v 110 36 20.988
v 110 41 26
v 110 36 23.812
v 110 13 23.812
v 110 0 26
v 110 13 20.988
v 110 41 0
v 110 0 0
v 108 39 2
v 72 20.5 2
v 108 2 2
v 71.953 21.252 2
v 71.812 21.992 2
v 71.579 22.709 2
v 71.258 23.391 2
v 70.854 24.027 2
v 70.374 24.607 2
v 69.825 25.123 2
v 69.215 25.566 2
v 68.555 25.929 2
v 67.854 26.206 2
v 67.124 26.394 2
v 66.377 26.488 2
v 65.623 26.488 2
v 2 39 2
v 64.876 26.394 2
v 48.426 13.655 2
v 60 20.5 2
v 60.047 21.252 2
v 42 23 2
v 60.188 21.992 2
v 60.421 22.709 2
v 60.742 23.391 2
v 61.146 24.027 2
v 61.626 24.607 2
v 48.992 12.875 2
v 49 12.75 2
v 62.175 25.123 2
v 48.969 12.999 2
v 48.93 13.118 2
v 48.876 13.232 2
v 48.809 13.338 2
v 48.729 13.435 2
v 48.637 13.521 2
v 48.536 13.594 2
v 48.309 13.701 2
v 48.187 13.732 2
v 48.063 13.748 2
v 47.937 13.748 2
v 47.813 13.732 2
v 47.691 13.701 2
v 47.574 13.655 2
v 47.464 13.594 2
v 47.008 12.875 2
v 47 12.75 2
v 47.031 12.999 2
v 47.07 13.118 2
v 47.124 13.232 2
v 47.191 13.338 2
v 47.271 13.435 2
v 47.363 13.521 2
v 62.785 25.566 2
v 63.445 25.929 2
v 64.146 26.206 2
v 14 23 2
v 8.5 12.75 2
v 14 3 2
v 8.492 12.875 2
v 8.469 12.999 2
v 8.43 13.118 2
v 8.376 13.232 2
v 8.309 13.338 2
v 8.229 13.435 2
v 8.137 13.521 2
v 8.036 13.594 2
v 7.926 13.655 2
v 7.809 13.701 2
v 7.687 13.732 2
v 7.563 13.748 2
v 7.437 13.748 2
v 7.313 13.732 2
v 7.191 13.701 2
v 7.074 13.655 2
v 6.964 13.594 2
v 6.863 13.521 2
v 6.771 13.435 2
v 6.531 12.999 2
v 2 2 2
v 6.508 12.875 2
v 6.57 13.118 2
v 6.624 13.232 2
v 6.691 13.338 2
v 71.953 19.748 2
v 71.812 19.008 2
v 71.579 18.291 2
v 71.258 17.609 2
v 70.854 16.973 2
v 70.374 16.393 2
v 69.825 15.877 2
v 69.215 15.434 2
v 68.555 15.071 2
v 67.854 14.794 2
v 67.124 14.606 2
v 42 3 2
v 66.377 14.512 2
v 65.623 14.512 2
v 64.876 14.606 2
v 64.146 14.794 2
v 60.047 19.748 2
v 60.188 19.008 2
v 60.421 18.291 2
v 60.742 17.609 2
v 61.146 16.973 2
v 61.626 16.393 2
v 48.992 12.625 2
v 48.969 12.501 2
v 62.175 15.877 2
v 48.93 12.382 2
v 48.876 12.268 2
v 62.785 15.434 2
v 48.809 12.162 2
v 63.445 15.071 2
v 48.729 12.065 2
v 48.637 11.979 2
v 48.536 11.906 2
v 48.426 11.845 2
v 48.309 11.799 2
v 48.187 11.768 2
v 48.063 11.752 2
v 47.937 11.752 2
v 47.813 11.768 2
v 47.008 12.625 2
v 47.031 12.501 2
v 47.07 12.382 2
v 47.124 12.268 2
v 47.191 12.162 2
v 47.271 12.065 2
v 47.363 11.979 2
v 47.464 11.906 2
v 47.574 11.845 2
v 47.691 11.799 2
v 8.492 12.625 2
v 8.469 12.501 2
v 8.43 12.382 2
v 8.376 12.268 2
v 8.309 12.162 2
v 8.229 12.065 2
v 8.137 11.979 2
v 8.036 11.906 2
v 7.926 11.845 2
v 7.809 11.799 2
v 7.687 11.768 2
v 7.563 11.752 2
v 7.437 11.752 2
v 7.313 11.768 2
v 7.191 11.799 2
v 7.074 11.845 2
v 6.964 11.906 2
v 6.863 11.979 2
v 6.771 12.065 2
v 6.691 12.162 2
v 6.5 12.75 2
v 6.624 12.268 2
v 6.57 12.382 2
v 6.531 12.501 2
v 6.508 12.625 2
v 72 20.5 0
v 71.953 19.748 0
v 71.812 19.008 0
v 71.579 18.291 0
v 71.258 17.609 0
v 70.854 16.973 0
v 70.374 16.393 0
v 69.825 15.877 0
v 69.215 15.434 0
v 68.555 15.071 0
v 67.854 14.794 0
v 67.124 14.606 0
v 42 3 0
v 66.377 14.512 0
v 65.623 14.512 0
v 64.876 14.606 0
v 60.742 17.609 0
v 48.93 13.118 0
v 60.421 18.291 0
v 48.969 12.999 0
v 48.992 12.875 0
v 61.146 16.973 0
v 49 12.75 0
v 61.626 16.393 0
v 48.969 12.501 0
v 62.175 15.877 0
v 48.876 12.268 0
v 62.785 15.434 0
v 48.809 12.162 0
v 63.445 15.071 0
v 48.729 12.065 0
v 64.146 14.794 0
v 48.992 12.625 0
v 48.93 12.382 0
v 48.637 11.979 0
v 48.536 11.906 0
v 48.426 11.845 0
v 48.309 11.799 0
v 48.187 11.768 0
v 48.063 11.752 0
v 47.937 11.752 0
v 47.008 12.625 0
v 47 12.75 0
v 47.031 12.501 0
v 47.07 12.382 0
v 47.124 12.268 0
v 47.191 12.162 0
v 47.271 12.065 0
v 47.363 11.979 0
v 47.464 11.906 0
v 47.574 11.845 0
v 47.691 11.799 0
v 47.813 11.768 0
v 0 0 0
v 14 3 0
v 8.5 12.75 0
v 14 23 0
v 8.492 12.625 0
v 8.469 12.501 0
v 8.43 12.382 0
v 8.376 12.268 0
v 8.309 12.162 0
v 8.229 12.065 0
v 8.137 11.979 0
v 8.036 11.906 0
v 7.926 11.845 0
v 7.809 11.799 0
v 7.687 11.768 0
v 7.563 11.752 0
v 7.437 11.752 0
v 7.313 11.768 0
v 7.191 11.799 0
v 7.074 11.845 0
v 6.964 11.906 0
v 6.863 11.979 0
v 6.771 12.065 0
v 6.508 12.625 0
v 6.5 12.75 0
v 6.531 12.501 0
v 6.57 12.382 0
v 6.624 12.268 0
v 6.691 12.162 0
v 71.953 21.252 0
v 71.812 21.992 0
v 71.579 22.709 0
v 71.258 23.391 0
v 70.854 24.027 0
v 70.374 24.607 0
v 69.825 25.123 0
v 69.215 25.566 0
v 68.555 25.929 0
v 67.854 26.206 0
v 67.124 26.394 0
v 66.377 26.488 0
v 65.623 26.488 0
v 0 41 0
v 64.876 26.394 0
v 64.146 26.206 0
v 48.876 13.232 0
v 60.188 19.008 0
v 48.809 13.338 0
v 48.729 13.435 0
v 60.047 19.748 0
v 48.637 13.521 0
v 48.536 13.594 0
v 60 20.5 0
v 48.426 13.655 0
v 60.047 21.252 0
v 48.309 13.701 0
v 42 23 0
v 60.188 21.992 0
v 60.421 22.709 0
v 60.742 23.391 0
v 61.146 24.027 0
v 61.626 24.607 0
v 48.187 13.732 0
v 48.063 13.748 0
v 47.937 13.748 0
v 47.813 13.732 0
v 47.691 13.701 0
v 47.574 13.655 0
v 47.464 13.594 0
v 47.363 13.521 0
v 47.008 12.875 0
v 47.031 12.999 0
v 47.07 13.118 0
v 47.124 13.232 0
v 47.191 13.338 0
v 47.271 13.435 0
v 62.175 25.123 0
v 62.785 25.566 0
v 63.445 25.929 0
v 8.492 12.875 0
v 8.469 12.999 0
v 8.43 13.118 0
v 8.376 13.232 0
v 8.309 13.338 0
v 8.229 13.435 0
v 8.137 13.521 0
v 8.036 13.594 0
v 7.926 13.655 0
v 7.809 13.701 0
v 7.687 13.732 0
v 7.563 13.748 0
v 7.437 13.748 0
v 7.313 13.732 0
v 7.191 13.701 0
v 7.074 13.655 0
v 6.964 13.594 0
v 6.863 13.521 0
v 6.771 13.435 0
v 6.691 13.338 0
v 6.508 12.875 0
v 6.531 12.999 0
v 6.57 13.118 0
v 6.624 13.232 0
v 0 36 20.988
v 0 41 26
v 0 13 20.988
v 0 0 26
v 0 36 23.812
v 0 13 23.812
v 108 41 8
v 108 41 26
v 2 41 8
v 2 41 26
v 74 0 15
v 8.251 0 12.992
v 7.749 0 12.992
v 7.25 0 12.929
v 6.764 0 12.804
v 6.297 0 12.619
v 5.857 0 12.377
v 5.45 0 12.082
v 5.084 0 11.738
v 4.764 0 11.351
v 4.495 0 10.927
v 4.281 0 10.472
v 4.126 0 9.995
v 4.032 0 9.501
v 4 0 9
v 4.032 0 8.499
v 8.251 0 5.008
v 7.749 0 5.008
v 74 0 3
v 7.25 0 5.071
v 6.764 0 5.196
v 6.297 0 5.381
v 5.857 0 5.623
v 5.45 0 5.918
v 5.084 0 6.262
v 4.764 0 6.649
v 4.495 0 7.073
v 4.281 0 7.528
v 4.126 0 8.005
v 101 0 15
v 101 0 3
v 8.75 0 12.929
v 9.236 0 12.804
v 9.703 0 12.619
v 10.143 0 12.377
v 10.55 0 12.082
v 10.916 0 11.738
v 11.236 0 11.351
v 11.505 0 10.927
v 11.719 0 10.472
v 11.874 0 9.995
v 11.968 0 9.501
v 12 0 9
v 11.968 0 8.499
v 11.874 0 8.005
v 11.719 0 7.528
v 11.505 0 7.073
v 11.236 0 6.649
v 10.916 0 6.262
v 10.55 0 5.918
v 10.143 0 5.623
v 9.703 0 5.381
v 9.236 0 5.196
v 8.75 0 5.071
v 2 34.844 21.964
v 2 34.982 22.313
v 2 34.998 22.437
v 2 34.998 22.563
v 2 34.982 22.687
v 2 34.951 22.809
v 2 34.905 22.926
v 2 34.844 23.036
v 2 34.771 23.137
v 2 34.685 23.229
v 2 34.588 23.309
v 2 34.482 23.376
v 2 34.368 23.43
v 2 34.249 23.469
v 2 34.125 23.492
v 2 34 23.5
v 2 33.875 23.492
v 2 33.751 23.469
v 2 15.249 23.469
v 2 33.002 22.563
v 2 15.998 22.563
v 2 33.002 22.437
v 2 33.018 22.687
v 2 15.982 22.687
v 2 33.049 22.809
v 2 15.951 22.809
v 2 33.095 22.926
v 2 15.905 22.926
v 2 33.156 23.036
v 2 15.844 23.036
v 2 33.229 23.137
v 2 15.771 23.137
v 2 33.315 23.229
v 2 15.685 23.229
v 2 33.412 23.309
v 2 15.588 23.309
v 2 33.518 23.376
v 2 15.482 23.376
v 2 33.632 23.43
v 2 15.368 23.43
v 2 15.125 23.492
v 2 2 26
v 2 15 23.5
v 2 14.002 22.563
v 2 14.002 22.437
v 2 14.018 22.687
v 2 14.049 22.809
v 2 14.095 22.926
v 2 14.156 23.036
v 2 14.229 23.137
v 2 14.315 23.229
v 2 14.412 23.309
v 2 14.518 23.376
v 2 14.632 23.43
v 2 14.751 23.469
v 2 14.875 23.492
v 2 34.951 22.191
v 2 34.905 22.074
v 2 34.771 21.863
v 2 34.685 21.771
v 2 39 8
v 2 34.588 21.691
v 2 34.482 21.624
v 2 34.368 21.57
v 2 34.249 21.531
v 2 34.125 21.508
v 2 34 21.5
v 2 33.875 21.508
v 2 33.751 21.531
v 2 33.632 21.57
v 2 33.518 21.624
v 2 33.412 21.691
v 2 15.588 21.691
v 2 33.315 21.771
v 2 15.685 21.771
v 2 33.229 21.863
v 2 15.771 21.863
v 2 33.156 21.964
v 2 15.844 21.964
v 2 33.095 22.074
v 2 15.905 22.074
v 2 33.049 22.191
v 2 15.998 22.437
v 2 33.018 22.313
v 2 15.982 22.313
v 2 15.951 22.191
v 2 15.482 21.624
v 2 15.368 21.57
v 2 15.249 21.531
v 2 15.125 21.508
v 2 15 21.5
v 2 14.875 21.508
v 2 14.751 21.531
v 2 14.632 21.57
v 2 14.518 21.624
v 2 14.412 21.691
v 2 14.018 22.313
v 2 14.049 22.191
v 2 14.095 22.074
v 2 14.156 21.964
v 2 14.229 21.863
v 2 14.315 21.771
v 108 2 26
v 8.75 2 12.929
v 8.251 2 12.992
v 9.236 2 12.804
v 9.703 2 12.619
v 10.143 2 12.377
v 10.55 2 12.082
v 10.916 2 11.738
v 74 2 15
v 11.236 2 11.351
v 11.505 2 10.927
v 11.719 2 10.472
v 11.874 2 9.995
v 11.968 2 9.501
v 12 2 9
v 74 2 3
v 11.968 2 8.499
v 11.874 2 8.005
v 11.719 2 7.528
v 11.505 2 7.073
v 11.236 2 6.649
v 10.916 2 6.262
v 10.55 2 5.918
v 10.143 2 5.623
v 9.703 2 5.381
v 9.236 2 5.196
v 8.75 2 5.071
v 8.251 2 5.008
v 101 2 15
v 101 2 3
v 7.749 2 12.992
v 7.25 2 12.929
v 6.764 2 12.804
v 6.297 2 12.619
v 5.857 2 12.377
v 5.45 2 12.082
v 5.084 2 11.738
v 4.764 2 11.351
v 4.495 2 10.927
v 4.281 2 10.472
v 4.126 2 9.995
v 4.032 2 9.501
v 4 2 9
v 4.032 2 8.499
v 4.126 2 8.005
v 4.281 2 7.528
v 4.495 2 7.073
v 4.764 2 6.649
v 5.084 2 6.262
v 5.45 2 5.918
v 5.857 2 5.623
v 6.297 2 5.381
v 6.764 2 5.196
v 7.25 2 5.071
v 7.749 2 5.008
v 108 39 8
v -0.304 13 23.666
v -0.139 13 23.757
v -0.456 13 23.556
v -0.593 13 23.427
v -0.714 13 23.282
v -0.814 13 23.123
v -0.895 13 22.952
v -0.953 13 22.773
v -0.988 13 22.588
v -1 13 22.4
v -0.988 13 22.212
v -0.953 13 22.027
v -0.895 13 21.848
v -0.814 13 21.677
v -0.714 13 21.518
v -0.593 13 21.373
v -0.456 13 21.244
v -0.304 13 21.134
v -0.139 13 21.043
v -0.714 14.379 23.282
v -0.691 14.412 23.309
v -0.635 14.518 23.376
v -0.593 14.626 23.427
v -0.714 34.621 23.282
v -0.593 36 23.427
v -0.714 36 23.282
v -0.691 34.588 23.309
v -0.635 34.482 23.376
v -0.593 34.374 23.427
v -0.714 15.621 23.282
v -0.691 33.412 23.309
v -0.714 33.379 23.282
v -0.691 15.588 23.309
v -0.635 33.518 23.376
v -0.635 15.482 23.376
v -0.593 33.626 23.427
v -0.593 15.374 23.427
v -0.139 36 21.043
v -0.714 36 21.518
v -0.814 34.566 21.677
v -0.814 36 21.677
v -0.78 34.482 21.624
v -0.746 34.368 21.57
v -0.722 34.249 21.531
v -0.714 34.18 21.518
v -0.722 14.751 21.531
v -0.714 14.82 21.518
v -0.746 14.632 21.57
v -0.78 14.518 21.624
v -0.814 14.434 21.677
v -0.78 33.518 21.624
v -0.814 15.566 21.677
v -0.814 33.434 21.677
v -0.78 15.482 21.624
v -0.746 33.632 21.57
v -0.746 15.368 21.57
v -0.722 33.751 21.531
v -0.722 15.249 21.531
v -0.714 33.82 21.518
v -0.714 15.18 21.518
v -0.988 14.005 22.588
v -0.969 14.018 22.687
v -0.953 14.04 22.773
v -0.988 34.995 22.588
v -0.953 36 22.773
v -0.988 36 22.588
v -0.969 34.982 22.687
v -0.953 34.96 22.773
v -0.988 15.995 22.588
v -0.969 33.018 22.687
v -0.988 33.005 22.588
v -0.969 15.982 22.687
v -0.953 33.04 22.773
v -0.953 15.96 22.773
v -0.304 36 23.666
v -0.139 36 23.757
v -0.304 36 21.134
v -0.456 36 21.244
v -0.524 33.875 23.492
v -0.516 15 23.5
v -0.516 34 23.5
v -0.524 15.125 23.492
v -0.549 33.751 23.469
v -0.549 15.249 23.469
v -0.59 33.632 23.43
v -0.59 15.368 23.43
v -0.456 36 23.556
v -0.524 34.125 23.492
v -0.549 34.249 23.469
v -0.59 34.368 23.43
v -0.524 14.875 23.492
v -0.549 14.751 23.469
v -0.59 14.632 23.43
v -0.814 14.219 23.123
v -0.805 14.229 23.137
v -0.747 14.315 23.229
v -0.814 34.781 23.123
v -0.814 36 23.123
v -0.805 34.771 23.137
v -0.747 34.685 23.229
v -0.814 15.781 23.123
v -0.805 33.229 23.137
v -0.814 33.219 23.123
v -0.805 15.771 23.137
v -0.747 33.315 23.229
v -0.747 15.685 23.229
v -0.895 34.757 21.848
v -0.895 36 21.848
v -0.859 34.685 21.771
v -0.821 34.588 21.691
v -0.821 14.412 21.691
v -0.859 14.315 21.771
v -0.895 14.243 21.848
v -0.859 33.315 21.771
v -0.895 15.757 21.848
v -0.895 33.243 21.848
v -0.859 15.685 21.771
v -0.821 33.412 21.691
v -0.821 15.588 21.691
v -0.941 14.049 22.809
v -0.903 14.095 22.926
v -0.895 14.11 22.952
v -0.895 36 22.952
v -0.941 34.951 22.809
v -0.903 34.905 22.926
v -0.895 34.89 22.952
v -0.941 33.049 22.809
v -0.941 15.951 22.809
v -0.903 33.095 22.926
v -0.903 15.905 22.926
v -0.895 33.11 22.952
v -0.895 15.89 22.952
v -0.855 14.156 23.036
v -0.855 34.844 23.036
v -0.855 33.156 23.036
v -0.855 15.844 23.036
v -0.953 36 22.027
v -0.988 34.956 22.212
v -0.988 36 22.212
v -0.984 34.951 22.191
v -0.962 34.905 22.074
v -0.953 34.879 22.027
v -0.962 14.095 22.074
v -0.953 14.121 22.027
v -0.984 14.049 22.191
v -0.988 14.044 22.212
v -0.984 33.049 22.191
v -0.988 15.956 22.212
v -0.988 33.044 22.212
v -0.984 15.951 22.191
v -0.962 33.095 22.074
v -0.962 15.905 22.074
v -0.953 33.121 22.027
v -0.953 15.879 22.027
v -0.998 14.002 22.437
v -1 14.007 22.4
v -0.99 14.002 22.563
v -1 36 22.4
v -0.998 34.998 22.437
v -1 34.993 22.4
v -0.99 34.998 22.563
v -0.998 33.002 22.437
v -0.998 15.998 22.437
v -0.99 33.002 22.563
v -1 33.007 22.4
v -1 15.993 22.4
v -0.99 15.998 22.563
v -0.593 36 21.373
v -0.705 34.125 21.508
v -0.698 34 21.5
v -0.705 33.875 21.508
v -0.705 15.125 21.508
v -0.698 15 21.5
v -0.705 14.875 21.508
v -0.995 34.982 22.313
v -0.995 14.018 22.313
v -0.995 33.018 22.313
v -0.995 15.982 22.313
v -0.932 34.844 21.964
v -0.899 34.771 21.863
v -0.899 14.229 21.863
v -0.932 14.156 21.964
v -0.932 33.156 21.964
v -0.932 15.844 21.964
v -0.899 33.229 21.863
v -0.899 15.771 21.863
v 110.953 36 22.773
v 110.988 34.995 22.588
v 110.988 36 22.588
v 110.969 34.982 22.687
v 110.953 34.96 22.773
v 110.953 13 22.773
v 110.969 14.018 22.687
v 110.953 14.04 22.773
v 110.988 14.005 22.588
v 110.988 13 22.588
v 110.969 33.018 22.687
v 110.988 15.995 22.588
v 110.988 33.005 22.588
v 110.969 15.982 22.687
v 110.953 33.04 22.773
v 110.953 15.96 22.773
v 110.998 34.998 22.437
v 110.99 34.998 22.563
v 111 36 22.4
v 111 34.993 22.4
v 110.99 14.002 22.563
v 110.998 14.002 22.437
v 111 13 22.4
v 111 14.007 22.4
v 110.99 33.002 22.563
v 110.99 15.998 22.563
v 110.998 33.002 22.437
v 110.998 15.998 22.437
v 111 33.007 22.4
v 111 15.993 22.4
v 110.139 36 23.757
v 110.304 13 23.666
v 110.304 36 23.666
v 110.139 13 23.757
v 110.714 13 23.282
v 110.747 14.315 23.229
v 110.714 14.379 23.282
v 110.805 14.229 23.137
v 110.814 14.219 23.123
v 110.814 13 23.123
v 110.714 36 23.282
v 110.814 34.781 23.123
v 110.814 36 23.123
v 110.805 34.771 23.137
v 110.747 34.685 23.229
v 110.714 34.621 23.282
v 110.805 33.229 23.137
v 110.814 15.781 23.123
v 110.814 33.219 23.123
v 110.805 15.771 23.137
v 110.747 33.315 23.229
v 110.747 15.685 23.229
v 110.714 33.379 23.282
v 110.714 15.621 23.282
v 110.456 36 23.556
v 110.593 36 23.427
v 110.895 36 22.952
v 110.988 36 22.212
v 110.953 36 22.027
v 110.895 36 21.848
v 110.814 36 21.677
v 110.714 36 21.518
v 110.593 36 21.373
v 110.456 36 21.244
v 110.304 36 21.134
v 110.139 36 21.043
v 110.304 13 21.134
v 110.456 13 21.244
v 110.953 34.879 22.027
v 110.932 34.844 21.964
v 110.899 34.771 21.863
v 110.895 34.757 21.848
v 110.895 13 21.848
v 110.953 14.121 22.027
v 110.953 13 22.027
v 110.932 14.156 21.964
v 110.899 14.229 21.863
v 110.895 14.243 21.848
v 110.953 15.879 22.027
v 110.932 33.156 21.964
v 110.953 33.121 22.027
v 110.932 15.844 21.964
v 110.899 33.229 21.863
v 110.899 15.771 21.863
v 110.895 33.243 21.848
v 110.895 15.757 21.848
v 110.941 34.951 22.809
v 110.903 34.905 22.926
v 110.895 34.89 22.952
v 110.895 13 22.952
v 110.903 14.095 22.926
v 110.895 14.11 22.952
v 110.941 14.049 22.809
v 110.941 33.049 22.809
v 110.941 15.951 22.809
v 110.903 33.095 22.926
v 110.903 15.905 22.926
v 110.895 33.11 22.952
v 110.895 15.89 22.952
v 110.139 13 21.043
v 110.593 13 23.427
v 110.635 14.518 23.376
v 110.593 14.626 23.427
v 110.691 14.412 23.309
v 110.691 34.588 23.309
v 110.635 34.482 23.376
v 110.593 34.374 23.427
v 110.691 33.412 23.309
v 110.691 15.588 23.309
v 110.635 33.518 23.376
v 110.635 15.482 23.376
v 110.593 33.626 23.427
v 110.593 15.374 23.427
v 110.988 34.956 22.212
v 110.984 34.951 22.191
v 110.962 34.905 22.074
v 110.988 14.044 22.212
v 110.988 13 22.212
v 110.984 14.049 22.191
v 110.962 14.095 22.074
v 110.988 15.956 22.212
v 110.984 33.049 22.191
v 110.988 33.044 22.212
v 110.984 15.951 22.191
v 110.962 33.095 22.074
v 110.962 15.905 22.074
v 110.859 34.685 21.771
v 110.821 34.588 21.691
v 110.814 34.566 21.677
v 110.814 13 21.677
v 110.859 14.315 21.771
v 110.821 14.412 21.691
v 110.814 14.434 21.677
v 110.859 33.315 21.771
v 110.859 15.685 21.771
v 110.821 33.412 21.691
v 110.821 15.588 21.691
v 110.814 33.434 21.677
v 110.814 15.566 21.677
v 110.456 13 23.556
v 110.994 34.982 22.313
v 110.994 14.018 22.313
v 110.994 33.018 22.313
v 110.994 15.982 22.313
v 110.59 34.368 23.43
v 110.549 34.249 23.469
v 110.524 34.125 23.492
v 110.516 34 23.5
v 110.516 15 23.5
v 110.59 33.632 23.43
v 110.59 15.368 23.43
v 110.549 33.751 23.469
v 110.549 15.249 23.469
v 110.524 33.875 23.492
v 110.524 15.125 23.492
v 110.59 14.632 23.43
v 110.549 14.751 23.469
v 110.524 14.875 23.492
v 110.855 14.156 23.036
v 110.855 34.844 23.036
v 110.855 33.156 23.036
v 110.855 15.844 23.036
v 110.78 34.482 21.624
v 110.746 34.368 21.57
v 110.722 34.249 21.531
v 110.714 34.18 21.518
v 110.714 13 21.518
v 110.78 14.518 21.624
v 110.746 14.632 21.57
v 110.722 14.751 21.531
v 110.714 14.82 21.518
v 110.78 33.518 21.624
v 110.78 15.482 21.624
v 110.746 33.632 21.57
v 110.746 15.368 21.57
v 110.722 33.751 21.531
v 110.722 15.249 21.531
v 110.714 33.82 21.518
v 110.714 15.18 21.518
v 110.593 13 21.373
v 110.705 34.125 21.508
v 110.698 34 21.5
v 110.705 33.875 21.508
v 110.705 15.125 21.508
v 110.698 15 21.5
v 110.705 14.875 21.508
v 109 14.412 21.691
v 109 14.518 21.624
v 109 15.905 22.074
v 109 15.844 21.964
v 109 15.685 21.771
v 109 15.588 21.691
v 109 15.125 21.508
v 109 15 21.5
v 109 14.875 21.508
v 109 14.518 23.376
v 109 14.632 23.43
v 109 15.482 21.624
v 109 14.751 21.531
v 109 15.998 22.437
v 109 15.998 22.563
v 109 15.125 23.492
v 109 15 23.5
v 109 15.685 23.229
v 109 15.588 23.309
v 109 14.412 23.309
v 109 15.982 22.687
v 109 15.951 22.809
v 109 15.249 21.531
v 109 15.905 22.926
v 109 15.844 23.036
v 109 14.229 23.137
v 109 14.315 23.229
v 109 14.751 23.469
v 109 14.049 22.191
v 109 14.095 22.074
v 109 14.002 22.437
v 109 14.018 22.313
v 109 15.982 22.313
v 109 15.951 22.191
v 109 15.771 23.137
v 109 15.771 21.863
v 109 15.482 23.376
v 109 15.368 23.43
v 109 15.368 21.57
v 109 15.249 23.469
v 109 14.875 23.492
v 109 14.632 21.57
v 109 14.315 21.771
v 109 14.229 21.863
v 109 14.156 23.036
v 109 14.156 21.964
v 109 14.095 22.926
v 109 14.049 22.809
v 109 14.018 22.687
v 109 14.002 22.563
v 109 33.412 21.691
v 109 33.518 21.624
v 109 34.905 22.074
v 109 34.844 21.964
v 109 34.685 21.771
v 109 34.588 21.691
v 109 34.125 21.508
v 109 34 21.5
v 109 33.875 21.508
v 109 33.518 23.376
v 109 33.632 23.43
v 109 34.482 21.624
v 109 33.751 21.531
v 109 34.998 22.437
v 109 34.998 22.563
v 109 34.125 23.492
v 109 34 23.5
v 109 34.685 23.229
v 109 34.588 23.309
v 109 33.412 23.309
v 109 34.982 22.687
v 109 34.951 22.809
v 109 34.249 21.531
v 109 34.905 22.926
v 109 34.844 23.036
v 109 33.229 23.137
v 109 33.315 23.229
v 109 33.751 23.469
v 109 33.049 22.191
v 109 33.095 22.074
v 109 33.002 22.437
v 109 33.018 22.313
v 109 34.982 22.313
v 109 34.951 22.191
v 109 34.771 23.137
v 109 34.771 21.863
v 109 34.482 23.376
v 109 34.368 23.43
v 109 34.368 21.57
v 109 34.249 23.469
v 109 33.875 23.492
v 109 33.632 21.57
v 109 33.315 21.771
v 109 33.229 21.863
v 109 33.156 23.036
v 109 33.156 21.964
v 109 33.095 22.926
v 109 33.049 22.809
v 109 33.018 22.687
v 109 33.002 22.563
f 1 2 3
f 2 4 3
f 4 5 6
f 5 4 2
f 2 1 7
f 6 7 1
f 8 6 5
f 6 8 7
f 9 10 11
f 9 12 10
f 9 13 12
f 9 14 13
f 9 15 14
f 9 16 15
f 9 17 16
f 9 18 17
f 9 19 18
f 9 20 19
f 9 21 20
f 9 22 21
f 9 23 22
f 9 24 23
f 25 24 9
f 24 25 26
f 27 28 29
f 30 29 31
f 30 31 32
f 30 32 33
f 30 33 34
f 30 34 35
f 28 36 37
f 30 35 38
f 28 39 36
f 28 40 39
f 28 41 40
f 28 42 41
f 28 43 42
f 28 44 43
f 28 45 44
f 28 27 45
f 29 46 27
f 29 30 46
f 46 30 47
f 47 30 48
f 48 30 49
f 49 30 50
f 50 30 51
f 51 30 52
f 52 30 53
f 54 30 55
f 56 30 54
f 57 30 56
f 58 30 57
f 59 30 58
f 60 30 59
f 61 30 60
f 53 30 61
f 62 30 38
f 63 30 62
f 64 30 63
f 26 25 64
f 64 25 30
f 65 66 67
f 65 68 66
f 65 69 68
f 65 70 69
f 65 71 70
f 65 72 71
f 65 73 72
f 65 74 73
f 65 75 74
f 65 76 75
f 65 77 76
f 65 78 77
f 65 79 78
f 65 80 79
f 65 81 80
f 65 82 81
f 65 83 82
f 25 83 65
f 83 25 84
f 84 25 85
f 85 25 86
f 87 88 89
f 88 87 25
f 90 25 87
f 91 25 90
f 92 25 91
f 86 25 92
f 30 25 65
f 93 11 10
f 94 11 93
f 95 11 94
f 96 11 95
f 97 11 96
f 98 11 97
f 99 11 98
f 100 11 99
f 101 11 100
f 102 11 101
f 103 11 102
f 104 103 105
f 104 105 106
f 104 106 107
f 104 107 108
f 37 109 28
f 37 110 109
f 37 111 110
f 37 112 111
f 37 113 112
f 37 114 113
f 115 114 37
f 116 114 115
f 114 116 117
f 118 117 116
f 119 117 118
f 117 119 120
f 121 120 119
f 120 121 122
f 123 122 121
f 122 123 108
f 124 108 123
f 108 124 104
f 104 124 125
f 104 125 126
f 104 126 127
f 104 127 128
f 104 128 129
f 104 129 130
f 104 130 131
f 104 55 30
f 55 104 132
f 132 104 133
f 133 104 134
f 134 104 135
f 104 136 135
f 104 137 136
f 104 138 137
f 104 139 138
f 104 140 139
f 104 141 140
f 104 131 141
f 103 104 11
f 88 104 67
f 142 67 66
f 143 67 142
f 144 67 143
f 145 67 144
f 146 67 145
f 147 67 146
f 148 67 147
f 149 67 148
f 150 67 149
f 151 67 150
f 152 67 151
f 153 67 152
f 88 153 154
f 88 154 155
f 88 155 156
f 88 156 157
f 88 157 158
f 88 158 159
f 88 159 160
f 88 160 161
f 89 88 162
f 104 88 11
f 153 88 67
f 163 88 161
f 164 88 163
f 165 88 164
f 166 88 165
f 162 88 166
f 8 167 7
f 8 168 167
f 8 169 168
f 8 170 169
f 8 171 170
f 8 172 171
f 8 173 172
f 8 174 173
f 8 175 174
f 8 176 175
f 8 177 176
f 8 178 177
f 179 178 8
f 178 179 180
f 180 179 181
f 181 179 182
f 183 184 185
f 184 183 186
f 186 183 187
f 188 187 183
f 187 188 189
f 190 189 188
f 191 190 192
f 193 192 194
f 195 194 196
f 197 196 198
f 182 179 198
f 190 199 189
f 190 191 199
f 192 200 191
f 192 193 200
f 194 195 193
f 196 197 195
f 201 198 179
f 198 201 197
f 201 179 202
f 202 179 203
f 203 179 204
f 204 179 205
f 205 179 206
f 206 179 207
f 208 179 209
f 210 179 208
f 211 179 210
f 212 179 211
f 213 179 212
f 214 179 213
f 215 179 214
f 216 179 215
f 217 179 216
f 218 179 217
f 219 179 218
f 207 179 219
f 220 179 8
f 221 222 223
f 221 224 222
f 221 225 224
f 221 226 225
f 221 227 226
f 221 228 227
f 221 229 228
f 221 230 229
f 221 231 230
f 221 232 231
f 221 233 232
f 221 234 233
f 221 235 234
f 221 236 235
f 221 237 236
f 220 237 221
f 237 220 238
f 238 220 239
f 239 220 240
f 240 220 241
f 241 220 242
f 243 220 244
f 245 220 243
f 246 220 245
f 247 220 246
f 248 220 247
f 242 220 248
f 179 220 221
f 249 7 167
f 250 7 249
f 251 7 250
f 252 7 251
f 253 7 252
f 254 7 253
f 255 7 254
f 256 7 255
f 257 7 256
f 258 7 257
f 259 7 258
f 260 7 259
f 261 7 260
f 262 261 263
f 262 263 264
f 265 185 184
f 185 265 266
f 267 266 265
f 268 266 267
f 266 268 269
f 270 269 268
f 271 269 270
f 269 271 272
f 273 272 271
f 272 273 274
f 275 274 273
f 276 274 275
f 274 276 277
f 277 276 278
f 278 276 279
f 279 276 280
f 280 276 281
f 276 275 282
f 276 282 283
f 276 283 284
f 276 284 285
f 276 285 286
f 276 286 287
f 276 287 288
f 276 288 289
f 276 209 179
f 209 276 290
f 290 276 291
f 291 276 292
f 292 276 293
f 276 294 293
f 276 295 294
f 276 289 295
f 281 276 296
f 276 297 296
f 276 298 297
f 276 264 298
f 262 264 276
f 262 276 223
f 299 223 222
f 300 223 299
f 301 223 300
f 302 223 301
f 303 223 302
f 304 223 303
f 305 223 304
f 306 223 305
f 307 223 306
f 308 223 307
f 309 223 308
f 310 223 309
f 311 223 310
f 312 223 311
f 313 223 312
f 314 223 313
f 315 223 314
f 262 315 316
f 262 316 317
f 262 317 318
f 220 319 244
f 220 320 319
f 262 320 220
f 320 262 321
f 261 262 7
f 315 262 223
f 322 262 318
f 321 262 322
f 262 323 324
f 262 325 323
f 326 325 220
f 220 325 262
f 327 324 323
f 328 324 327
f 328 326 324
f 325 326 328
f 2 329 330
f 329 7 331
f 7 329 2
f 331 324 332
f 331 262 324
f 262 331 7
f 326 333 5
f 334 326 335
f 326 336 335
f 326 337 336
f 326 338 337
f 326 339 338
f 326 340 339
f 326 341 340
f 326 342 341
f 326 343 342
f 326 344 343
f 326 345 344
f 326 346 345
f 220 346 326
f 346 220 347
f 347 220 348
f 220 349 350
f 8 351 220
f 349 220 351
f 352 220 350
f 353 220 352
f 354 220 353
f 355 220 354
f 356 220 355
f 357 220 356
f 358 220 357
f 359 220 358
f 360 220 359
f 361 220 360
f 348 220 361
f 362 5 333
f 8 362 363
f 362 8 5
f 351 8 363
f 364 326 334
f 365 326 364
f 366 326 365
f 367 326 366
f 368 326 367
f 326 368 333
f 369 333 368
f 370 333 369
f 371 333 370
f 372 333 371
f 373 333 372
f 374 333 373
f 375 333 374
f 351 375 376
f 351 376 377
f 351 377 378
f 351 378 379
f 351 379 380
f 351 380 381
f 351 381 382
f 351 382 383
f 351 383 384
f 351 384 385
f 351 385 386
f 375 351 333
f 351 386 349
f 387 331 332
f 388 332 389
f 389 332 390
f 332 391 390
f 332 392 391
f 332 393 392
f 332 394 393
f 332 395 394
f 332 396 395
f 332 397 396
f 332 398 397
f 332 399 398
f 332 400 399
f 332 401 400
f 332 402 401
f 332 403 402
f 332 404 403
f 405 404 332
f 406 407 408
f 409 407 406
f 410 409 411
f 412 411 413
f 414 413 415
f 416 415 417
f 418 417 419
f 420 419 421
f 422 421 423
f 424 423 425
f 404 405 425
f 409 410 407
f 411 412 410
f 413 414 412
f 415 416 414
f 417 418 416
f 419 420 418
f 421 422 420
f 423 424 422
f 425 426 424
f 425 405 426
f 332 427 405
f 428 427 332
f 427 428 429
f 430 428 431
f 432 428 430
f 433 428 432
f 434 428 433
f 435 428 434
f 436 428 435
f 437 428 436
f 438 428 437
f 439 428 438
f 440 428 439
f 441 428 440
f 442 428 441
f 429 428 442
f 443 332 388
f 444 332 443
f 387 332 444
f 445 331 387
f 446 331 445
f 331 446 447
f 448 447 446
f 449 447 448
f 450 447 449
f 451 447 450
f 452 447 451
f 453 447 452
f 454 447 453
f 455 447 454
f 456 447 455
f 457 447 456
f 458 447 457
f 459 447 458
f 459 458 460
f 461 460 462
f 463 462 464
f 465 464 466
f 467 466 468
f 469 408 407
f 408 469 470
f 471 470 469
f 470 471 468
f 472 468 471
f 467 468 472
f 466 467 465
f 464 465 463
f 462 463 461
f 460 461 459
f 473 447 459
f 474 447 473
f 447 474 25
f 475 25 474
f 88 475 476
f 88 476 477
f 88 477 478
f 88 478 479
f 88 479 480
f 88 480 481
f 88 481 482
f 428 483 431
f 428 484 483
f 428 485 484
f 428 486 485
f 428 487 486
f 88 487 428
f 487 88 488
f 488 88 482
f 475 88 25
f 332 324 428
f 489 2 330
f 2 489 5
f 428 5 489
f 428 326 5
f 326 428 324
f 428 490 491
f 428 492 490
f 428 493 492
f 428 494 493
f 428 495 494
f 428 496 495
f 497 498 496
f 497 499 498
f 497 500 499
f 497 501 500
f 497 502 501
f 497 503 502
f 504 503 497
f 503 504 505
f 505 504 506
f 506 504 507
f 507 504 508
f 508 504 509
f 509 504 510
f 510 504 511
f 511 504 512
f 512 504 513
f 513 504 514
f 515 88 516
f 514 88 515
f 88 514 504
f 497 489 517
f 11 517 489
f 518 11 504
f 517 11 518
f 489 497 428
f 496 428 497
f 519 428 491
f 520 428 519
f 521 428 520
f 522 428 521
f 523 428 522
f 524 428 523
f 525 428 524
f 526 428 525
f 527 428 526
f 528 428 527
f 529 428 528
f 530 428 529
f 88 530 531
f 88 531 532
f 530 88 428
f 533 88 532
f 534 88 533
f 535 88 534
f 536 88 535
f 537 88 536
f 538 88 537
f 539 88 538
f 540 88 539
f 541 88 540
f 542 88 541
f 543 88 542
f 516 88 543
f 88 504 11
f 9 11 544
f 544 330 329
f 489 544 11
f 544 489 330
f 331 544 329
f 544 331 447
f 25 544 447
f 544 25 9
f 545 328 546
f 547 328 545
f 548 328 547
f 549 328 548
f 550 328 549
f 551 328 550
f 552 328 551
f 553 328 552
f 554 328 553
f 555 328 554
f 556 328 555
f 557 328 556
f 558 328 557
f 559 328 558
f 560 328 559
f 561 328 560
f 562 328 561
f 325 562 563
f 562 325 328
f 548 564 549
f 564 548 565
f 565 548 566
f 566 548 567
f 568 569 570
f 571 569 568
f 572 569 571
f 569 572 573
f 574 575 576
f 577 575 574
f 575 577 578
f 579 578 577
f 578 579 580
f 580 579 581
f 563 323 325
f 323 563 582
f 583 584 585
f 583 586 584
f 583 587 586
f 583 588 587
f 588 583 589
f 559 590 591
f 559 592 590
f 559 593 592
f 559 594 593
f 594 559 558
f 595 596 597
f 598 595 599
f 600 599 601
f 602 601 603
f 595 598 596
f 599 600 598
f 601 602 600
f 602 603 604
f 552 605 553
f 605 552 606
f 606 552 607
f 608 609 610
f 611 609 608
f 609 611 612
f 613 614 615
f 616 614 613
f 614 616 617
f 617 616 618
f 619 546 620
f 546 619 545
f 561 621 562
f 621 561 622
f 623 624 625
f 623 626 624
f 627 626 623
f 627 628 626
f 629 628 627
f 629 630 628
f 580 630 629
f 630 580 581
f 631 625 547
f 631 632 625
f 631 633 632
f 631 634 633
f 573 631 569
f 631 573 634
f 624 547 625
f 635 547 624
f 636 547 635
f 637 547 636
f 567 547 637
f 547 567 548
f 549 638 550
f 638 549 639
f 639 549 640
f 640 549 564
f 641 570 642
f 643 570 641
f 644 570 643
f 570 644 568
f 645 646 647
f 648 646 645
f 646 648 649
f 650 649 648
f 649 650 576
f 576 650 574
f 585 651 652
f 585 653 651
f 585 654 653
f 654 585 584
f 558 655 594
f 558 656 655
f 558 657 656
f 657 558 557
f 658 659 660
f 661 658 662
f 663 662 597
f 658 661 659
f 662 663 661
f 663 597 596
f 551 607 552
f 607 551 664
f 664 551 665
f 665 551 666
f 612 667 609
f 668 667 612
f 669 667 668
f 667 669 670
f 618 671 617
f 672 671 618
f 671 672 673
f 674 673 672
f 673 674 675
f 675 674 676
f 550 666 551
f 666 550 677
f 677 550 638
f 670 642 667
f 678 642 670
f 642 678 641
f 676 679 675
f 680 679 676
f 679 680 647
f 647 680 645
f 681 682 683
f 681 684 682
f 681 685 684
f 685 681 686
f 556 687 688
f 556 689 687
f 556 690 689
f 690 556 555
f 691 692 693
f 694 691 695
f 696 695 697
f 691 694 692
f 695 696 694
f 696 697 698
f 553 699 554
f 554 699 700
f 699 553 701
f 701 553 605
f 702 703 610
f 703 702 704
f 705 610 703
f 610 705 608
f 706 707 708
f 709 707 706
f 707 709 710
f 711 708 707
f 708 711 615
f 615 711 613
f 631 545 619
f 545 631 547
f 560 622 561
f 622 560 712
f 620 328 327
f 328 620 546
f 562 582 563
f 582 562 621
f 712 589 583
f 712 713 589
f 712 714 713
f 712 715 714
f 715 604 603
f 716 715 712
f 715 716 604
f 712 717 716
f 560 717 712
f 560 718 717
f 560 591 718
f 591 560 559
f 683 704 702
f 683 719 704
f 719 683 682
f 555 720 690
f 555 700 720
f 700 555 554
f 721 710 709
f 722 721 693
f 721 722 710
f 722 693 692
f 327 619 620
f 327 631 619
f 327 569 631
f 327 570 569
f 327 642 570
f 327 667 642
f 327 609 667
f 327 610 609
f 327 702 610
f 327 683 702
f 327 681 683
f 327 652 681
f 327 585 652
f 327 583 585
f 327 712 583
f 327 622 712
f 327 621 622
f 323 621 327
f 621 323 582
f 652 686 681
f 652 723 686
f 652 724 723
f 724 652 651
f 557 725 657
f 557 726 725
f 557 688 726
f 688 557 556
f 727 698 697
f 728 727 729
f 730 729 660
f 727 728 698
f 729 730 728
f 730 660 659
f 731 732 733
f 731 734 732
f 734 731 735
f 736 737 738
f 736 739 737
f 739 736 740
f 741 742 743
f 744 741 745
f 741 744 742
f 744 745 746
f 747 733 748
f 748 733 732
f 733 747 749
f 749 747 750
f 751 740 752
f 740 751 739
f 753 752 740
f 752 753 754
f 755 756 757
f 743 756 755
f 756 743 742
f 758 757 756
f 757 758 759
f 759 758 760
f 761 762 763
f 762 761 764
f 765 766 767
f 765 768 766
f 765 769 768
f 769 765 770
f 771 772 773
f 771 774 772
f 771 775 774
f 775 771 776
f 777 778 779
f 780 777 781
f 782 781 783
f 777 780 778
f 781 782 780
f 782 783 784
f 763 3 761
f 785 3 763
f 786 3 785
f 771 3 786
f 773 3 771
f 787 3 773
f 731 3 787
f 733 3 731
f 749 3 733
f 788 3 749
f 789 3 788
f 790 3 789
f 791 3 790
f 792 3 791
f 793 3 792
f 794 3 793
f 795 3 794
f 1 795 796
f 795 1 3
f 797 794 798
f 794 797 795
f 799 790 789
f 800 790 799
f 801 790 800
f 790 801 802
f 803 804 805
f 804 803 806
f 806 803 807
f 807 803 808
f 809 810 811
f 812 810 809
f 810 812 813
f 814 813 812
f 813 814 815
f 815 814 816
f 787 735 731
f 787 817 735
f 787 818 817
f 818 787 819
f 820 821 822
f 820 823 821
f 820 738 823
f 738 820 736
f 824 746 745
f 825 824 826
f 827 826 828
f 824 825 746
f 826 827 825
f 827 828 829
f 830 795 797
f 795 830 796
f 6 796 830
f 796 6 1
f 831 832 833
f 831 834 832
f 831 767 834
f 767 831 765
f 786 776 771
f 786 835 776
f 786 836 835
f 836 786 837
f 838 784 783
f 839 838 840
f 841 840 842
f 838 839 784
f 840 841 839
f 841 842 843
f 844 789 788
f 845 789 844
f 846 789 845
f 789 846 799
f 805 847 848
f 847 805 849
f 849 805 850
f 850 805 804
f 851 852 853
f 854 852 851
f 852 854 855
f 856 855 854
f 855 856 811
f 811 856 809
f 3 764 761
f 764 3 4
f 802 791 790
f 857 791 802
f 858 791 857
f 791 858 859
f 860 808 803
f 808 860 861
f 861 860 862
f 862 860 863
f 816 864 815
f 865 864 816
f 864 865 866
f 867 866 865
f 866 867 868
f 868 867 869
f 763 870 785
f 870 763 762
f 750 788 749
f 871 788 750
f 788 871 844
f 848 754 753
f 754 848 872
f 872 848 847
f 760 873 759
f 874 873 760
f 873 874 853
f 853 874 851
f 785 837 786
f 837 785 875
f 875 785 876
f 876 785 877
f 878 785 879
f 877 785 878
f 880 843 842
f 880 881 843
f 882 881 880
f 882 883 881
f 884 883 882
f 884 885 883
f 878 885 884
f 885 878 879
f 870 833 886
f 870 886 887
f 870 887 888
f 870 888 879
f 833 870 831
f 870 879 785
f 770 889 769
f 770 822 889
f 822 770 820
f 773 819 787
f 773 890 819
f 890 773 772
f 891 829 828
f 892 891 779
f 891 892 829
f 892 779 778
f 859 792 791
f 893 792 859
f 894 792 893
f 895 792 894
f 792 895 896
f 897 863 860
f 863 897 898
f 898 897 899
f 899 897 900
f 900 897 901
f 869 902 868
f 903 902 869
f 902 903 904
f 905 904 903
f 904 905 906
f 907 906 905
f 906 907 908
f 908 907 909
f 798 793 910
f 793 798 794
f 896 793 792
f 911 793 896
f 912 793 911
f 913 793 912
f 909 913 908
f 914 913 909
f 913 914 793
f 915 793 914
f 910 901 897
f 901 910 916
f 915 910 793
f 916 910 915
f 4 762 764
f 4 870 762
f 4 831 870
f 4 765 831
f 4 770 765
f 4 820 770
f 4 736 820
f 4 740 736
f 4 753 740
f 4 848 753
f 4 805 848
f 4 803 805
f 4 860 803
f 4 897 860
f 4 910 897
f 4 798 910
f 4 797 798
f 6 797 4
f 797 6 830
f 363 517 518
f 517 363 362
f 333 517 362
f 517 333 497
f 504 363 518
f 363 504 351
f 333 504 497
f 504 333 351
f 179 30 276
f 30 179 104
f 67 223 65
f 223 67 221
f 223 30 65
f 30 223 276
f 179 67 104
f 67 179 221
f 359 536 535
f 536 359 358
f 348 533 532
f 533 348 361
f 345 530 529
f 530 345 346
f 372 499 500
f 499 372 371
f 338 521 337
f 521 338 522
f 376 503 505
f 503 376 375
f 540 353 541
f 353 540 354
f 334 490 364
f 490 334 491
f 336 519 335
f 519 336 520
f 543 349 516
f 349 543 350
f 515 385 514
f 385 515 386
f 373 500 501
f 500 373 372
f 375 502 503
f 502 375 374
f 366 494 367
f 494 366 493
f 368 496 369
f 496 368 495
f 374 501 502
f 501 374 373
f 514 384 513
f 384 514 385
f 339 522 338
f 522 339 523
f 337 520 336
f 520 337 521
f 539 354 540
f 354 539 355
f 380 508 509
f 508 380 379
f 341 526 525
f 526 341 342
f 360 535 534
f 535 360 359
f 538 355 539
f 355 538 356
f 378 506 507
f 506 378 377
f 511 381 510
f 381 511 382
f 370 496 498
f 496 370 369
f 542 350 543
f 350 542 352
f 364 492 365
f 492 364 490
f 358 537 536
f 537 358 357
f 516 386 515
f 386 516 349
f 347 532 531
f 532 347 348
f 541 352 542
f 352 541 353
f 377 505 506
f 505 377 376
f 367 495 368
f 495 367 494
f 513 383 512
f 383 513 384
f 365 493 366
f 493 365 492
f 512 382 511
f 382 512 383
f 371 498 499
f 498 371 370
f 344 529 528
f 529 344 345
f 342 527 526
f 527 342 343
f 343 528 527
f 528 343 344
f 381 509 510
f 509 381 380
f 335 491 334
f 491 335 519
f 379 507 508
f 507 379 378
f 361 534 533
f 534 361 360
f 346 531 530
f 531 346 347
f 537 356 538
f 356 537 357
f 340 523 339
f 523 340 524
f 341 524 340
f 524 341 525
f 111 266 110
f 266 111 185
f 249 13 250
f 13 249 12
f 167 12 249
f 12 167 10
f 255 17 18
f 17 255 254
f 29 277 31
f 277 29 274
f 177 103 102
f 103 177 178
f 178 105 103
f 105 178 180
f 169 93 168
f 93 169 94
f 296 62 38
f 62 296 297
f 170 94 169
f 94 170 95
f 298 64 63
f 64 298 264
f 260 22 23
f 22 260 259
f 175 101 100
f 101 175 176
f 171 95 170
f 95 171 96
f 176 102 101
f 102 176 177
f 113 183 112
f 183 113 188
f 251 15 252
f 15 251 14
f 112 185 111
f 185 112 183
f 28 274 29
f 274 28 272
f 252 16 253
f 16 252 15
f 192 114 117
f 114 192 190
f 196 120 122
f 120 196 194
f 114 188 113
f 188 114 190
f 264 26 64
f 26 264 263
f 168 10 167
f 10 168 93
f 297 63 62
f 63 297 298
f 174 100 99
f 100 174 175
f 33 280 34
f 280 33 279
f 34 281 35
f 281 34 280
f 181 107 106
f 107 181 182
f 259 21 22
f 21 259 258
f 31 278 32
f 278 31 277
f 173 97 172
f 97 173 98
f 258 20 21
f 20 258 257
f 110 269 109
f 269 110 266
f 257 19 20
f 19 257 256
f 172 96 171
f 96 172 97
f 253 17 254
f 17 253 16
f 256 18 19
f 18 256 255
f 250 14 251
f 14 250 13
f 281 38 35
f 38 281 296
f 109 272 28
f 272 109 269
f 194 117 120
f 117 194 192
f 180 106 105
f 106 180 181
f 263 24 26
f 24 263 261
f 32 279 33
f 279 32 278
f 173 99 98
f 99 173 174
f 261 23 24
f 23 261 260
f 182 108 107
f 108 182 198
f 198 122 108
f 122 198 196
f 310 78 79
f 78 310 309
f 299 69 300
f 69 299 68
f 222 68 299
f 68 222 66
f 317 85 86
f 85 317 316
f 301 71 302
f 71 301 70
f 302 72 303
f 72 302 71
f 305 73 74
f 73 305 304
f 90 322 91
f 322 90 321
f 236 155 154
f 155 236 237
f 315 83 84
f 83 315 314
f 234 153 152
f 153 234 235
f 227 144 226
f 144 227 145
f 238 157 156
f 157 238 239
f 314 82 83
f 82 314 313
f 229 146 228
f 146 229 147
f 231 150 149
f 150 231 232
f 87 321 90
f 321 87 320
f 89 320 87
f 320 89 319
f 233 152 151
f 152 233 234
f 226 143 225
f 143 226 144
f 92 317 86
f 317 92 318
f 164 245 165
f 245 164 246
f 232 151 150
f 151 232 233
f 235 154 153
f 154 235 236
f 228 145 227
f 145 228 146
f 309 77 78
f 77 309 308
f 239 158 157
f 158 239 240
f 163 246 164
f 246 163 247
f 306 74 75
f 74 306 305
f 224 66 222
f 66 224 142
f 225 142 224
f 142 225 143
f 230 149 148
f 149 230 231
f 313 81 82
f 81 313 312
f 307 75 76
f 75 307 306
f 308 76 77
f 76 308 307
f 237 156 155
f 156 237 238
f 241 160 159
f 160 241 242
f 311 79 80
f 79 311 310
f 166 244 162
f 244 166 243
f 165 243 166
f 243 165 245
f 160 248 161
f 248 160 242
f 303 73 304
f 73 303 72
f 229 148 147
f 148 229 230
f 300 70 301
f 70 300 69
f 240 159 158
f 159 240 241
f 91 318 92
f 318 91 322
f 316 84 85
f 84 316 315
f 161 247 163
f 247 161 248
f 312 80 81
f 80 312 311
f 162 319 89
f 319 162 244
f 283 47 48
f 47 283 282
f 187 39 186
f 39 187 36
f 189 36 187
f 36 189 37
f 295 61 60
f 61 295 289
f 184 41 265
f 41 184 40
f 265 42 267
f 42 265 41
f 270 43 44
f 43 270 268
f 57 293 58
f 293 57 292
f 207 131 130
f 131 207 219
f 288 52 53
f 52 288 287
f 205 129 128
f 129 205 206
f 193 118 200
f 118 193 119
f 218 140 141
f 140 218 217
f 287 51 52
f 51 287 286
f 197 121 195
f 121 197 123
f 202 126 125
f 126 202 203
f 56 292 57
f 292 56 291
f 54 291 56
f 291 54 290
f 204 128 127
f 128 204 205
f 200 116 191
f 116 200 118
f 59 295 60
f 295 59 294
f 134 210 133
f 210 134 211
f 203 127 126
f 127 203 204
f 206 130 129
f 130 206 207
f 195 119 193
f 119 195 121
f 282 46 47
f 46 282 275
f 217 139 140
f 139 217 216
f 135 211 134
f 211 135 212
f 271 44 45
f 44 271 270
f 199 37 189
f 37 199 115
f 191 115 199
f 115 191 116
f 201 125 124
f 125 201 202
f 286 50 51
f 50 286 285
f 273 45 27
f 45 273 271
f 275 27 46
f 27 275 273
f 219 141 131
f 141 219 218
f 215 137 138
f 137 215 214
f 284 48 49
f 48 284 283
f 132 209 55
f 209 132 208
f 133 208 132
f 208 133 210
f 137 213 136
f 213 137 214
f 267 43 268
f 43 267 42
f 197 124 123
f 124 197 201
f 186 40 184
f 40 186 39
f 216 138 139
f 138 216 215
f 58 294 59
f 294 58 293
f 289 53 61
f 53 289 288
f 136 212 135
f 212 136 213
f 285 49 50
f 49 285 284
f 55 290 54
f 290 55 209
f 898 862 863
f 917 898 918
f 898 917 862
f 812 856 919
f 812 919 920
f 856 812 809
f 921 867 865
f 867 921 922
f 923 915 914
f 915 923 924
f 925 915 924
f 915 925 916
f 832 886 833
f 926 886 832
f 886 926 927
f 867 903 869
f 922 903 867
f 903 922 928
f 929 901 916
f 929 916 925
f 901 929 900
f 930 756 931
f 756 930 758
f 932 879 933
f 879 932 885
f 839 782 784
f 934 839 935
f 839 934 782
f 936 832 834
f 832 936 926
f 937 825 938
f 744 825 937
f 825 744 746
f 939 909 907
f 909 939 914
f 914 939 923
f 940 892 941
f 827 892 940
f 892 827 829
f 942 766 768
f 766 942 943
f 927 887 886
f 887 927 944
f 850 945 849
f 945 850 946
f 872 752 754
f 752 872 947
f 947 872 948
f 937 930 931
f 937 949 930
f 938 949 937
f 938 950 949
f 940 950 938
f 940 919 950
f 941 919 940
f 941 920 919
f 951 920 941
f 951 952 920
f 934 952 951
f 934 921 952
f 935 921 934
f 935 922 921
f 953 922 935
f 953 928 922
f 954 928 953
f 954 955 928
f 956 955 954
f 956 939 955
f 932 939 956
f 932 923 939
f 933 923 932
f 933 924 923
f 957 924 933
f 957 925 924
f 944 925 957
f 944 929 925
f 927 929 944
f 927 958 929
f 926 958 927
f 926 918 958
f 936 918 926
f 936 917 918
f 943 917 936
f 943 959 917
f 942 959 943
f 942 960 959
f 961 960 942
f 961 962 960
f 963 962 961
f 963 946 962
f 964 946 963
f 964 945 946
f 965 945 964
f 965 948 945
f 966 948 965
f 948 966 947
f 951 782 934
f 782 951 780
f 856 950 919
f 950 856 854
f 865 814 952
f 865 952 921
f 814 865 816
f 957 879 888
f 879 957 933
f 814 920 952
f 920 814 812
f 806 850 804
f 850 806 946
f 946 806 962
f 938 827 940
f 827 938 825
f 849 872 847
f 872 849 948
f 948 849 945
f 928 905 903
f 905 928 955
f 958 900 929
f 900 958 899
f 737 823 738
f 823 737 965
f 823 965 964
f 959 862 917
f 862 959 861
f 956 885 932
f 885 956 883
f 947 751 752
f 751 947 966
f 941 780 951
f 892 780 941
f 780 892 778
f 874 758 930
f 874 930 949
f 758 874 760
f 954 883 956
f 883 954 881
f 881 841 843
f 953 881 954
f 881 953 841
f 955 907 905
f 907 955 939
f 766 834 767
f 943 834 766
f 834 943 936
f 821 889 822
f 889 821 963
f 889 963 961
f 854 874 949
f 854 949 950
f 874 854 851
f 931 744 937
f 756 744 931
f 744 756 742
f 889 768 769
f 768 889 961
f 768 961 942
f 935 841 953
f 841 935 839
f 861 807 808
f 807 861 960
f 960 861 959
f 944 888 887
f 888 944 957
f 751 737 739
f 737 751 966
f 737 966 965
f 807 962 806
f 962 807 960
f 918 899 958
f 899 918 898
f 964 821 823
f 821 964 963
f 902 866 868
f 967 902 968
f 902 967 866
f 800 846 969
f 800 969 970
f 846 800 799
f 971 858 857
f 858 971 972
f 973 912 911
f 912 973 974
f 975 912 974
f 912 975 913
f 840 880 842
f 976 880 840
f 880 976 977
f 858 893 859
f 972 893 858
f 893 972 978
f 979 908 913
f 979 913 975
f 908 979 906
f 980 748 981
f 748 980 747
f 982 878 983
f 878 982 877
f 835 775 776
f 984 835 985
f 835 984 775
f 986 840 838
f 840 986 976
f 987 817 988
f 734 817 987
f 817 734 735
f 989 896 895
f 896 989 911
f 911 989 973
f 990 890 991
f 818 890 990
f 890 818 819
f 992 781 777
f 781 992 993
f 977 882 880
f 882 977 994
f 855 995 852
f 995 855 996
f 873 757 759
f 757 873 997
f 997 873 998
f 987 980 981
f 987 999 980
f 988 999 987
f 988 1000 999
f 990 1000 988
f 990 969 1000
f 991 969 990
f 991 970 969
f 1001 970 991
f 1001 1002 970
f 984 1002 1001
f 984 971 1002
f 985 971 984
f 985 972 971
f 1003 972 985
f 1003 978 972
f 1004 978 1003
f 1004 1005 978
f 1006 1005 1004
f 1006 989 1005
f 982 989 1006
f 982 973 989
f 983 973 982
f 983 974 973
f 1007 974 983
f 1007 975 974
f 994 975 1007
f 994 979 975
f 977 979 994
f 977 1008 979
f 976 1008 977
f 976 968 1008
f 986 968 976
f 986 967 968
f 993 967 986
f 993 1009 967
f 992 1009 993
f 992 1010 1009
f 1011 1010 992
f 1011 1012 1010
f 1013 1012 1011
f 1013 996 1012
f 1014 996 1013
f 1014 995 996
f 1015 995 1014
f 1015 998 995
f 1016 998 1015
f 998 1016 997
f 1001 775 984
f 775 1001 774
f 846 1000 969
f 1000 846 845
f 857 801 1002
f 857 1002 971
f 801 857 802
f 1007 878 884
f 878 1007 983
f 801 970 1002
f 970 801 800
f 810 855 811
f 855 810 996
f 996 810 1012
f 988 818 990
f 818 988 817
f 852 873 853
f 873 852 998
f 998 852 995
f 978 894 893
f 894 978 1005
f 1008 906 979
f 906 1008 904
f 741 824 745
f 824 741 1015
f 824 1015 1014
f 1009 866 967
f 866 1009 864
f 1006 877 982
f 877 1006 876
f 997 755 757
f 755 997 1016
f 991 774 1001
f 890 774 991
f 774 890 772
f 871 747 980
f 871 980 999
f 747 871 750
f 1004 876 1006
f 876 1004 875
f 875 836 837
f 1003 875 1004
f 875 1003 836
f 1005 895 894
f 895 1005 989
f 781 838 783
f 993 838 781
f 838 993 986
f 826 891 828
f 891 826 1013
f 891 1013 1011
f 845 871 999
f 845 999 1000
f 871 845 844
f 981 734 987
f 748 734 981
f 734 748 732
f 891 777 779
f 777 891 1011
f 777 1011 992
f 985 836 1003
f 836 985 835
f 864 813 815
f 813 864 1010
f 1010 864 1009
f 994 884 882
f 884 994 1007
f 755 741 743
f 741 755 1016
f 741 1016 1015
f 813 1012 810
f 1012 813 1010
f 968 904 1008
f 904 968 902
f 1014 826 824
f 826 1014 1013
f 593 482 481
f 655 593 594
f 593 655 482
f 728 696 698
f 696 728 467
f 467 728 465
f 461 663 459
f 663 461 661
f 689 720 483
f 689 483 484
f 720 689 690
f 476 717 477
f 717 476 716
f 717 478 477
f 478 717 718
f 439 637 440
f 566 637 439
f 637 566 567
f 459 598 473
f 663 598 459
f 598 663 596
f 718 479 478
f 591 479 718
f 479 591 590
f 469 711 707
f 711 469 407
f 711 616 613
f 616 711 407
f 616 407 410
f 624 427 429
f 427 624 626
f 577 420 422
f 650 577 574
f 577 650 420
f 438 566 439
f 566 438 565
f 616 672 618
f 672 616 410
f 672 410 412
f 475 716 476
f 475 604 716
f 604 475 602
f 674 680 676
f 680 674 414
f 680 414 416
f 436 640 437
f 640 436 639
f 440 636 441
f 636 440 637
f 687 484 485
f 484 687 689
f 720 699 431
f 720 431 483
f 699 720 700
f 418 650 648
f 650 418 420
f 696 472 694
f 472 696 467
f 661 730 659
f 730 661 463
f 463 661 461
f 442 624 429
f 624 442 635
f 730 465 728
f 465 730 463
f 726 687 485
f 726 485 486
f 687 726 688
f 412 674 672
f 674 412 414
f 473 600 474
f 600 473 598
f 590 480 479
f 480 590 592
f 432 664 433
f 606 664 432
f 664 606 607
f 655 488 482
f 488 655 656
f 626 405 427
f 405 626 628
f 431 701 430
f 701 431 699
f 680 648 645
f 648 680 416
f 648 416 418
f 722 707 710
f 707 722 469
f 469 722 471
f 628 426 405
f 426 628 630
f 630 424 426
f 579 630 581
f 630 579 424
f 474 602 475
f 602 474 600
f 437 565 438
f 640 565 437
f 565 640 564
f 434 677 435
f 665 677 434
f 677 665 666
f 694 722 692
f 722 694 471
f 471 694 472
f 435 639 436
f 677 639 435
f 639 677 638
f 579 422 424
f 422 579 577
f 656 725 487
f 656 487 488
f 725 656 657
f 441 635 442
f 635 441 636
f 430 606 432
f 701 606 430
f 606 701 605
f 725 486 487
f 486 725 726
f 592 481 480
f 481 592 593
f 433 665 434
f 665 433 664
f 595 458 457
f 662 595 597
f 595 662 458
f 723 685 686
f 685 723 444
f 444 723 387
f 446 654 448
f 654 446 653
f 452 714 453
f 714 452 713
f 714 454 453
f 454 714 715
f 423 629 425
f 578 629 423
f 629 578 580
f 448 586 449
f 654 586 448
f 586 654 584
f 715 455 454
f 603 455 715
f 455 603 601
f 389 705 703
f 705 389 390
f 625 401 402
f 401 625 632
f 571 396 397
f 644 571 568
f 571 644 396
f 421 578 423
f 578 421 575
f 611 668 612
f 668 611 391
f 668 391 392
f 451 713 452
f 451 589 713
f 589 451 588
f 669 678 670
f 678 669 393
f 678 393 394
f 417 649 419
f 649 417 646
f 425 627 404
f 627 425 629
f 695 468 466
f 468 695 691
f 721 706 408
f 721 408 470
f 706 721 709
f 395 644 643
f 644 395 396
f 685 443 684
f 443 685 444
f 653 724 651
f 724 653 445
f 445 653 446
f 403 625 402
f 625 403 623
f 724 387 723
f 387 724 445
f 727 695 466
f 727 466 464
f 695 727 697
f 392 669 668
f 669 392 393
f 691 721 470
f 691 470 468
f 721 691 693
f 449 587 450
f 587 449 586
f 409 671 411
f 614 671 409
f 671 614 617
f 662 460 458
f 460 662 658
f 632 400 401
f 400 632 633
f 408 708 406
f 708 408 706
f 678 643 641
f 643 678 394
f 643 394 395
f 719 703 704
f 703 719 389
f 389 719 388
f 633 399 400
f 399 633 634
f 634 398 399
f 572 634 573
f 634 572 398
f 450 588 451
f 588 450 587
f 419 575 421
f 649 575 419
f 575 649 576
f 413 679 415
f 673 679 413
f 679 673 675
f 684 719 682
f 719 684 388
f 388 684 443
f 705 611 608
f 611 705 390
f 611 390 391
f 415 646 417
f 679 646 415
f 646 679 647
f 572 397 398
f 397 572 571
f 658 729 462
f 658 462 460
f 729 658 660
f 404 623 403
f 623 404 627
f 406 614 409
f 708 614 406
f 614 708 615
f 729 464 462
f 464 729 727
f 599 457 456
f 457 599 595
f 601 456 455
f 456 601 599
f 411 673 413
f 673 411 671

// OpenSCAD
/*************************************************************************************************
Power Supply Terminal Cover for the power supply commonly used with the Bukobot and other 3d printers
Author: Mike Thompson (thingiverse: mike_linus)
Modified by: Will Winder (thingiverse: Winder)
Date Last Modified: June 1, 2013
Description: simply change the cutout parameters and depth to suit. 
Note: do not change length, height and thickness parameters for the base unless you want to change the core dimensions.
**************************************************************************************************/

//***************************************************************
//don't change these base parameters unless you want to change the core dimensions.
//***************************************************************
/* [Enclosue Size] */
// Long edge of enclosure.

base_length=110;
// Height of enclosure.
base_height=41;

// Deptch of enclosure. Increase this to create more room for your electronics.
base_depth=26;

// Surface thickness of part. 2mm seems to be pretty good.
base_thickness=2;

// Size of hole for cover retaining screws.
mounting_screw_hole_cutout_radius=1;

// Size of hole for power plug screws.
power_screw_hole_cutout_radius=1;

//***************************************************************
//change these cutout parameters to suit you own switch size etc.
//***************************************************************
/* [Cutouts] */
// Square switch cutout - long edge. Set to zero if using a round cutout.
switch_cutout_length=27;
// Square switch cutout - short edge. Set to zero if using a round cutout.
switch_cutout_width=12;

// Round switch cutout radius. Set to zero to use a square cutout. Base depth must be increased depending on the size of your switch.
switch_cutout_radius=0;

// Radius of cutout for LED.
led_cutout_radius=4;
// Radius of cutout for 12v wires.
grommet_cutout_radius=6;

// Square power plug cutout - long edge.
power_plug_cutout_length=28;
// Square power plug cutout - short edge.
power_plug_cutout_width=20;

/* [Hidden] */
hole_resolution=50;
$fn=hole_resolution;

module base(){
union() {
	// 5 sides of the box.
	cube([base_length,base_height,base_thickness]);
	cube([base_thickness,base_height,base_depth]);
	cube([base_length,base_thickness,base_depth]);
	translate([base_length-base_thickness,0,0])cube([base_thickness,base_height,base_depth]);
	// Bottom wall has an 18mm gap at the rear for the terminal area.
	translate([0,base_height-base_thickness,0])cube([base_length,base_thickness,base_depth-18]);

	// (square) Original slot retainers
	//translate([-1,13,base_depth-5])cube([1.5,23,3]);
	//translate([base_length+base_thickness,13,base_depth-5])cube([1.5,23,3]);

	// (cylindrical) New slot retainers.
	translate([0.5,23+13,base_depth-3.6])rotate([90,0,0])
		cylinder(r=1.5, h=23);
	translate([base_length-0.5,23+13,base_depth-3.6])rotate([90,0,0])
		cylinder(r=1.5, h=23);

}
}

safety_margin = base_thickness/2;
difference(){
	base();
	//(square) switch cutout. 9mm away from one side.
	translate([base_length-9-switch_cutout_length,-safety_margin,3])
		cube([switch_cutout_length,base_thickness*2,switch_cutout_width]);

	//(round) switch cutout. Centered 18mm from one side.
	translate([base_length-18, base_thickness+safety_margin, 6+switch_cutout_radius])rotate([90,0,0])
		cylinder(r=switch_cutout_radius, h=base_thickness*2);

	//240v plug cutout. Centered 28mm from one side.
	translate([28-(power_plug_cutout_length/2),3,-safety_margin])
		cube([power_plug_cutout_length,power_plug_cutout_width,base_thickness*2]);

	//led cutout. Centered 8mm from one side.
	translate([8,base_thickness+safety_margin,9])rotate([90,0,0])
		cylinder(r=led_cutout_radius,h=base_thickness*2);

	//12v lead cutout. Shifted 3/5 of the way to one side.
	translate([base_length/5*3,base_height/2,-safety_margin])
		cylinder(r=grommet_cutout_radius,h=base_thickness*2);

	//2x 240v plug screw holes. Hard coded, deal with it!
	translate([7.5,12.75,-safety_margin])
		cylinder(r=power_screw_hole_cutout_radius,h=base_thickness*2);
	translate([48,12.75,-safety_margin])
		cylinder(r=power_screw_hole_cutout_radius,h=base_thickness*2);

	//4x retainer screw holes. 3.5mm away from the top.
	translate([base_length-safety_margin,15,base_depth-3.5])rotate([0,90,0])
		cylinder(r=mounting_screw_hole_cutout_radius,h=base_thickness*3);
	translate([base_length-safety_margin,34,base_depth-3.5])rotate([0,90,0])
		cylinder(r=mounting_screw_hole_cutout_radius,h=base_thickness*3);
	translate([-1-safety_margin,15,base_depth-3.5])rotate([0,90,0])
		cylinder(r=mounting_screw_hole_cutout_radius,h=base_thickness*3);
	translate([-1-safety_margin,34,base_depth-3.5])rotate([0,90,0])
		cylinder(r=mounting_screw_hole_cutout_radius,h=base_thickness*3);
}
